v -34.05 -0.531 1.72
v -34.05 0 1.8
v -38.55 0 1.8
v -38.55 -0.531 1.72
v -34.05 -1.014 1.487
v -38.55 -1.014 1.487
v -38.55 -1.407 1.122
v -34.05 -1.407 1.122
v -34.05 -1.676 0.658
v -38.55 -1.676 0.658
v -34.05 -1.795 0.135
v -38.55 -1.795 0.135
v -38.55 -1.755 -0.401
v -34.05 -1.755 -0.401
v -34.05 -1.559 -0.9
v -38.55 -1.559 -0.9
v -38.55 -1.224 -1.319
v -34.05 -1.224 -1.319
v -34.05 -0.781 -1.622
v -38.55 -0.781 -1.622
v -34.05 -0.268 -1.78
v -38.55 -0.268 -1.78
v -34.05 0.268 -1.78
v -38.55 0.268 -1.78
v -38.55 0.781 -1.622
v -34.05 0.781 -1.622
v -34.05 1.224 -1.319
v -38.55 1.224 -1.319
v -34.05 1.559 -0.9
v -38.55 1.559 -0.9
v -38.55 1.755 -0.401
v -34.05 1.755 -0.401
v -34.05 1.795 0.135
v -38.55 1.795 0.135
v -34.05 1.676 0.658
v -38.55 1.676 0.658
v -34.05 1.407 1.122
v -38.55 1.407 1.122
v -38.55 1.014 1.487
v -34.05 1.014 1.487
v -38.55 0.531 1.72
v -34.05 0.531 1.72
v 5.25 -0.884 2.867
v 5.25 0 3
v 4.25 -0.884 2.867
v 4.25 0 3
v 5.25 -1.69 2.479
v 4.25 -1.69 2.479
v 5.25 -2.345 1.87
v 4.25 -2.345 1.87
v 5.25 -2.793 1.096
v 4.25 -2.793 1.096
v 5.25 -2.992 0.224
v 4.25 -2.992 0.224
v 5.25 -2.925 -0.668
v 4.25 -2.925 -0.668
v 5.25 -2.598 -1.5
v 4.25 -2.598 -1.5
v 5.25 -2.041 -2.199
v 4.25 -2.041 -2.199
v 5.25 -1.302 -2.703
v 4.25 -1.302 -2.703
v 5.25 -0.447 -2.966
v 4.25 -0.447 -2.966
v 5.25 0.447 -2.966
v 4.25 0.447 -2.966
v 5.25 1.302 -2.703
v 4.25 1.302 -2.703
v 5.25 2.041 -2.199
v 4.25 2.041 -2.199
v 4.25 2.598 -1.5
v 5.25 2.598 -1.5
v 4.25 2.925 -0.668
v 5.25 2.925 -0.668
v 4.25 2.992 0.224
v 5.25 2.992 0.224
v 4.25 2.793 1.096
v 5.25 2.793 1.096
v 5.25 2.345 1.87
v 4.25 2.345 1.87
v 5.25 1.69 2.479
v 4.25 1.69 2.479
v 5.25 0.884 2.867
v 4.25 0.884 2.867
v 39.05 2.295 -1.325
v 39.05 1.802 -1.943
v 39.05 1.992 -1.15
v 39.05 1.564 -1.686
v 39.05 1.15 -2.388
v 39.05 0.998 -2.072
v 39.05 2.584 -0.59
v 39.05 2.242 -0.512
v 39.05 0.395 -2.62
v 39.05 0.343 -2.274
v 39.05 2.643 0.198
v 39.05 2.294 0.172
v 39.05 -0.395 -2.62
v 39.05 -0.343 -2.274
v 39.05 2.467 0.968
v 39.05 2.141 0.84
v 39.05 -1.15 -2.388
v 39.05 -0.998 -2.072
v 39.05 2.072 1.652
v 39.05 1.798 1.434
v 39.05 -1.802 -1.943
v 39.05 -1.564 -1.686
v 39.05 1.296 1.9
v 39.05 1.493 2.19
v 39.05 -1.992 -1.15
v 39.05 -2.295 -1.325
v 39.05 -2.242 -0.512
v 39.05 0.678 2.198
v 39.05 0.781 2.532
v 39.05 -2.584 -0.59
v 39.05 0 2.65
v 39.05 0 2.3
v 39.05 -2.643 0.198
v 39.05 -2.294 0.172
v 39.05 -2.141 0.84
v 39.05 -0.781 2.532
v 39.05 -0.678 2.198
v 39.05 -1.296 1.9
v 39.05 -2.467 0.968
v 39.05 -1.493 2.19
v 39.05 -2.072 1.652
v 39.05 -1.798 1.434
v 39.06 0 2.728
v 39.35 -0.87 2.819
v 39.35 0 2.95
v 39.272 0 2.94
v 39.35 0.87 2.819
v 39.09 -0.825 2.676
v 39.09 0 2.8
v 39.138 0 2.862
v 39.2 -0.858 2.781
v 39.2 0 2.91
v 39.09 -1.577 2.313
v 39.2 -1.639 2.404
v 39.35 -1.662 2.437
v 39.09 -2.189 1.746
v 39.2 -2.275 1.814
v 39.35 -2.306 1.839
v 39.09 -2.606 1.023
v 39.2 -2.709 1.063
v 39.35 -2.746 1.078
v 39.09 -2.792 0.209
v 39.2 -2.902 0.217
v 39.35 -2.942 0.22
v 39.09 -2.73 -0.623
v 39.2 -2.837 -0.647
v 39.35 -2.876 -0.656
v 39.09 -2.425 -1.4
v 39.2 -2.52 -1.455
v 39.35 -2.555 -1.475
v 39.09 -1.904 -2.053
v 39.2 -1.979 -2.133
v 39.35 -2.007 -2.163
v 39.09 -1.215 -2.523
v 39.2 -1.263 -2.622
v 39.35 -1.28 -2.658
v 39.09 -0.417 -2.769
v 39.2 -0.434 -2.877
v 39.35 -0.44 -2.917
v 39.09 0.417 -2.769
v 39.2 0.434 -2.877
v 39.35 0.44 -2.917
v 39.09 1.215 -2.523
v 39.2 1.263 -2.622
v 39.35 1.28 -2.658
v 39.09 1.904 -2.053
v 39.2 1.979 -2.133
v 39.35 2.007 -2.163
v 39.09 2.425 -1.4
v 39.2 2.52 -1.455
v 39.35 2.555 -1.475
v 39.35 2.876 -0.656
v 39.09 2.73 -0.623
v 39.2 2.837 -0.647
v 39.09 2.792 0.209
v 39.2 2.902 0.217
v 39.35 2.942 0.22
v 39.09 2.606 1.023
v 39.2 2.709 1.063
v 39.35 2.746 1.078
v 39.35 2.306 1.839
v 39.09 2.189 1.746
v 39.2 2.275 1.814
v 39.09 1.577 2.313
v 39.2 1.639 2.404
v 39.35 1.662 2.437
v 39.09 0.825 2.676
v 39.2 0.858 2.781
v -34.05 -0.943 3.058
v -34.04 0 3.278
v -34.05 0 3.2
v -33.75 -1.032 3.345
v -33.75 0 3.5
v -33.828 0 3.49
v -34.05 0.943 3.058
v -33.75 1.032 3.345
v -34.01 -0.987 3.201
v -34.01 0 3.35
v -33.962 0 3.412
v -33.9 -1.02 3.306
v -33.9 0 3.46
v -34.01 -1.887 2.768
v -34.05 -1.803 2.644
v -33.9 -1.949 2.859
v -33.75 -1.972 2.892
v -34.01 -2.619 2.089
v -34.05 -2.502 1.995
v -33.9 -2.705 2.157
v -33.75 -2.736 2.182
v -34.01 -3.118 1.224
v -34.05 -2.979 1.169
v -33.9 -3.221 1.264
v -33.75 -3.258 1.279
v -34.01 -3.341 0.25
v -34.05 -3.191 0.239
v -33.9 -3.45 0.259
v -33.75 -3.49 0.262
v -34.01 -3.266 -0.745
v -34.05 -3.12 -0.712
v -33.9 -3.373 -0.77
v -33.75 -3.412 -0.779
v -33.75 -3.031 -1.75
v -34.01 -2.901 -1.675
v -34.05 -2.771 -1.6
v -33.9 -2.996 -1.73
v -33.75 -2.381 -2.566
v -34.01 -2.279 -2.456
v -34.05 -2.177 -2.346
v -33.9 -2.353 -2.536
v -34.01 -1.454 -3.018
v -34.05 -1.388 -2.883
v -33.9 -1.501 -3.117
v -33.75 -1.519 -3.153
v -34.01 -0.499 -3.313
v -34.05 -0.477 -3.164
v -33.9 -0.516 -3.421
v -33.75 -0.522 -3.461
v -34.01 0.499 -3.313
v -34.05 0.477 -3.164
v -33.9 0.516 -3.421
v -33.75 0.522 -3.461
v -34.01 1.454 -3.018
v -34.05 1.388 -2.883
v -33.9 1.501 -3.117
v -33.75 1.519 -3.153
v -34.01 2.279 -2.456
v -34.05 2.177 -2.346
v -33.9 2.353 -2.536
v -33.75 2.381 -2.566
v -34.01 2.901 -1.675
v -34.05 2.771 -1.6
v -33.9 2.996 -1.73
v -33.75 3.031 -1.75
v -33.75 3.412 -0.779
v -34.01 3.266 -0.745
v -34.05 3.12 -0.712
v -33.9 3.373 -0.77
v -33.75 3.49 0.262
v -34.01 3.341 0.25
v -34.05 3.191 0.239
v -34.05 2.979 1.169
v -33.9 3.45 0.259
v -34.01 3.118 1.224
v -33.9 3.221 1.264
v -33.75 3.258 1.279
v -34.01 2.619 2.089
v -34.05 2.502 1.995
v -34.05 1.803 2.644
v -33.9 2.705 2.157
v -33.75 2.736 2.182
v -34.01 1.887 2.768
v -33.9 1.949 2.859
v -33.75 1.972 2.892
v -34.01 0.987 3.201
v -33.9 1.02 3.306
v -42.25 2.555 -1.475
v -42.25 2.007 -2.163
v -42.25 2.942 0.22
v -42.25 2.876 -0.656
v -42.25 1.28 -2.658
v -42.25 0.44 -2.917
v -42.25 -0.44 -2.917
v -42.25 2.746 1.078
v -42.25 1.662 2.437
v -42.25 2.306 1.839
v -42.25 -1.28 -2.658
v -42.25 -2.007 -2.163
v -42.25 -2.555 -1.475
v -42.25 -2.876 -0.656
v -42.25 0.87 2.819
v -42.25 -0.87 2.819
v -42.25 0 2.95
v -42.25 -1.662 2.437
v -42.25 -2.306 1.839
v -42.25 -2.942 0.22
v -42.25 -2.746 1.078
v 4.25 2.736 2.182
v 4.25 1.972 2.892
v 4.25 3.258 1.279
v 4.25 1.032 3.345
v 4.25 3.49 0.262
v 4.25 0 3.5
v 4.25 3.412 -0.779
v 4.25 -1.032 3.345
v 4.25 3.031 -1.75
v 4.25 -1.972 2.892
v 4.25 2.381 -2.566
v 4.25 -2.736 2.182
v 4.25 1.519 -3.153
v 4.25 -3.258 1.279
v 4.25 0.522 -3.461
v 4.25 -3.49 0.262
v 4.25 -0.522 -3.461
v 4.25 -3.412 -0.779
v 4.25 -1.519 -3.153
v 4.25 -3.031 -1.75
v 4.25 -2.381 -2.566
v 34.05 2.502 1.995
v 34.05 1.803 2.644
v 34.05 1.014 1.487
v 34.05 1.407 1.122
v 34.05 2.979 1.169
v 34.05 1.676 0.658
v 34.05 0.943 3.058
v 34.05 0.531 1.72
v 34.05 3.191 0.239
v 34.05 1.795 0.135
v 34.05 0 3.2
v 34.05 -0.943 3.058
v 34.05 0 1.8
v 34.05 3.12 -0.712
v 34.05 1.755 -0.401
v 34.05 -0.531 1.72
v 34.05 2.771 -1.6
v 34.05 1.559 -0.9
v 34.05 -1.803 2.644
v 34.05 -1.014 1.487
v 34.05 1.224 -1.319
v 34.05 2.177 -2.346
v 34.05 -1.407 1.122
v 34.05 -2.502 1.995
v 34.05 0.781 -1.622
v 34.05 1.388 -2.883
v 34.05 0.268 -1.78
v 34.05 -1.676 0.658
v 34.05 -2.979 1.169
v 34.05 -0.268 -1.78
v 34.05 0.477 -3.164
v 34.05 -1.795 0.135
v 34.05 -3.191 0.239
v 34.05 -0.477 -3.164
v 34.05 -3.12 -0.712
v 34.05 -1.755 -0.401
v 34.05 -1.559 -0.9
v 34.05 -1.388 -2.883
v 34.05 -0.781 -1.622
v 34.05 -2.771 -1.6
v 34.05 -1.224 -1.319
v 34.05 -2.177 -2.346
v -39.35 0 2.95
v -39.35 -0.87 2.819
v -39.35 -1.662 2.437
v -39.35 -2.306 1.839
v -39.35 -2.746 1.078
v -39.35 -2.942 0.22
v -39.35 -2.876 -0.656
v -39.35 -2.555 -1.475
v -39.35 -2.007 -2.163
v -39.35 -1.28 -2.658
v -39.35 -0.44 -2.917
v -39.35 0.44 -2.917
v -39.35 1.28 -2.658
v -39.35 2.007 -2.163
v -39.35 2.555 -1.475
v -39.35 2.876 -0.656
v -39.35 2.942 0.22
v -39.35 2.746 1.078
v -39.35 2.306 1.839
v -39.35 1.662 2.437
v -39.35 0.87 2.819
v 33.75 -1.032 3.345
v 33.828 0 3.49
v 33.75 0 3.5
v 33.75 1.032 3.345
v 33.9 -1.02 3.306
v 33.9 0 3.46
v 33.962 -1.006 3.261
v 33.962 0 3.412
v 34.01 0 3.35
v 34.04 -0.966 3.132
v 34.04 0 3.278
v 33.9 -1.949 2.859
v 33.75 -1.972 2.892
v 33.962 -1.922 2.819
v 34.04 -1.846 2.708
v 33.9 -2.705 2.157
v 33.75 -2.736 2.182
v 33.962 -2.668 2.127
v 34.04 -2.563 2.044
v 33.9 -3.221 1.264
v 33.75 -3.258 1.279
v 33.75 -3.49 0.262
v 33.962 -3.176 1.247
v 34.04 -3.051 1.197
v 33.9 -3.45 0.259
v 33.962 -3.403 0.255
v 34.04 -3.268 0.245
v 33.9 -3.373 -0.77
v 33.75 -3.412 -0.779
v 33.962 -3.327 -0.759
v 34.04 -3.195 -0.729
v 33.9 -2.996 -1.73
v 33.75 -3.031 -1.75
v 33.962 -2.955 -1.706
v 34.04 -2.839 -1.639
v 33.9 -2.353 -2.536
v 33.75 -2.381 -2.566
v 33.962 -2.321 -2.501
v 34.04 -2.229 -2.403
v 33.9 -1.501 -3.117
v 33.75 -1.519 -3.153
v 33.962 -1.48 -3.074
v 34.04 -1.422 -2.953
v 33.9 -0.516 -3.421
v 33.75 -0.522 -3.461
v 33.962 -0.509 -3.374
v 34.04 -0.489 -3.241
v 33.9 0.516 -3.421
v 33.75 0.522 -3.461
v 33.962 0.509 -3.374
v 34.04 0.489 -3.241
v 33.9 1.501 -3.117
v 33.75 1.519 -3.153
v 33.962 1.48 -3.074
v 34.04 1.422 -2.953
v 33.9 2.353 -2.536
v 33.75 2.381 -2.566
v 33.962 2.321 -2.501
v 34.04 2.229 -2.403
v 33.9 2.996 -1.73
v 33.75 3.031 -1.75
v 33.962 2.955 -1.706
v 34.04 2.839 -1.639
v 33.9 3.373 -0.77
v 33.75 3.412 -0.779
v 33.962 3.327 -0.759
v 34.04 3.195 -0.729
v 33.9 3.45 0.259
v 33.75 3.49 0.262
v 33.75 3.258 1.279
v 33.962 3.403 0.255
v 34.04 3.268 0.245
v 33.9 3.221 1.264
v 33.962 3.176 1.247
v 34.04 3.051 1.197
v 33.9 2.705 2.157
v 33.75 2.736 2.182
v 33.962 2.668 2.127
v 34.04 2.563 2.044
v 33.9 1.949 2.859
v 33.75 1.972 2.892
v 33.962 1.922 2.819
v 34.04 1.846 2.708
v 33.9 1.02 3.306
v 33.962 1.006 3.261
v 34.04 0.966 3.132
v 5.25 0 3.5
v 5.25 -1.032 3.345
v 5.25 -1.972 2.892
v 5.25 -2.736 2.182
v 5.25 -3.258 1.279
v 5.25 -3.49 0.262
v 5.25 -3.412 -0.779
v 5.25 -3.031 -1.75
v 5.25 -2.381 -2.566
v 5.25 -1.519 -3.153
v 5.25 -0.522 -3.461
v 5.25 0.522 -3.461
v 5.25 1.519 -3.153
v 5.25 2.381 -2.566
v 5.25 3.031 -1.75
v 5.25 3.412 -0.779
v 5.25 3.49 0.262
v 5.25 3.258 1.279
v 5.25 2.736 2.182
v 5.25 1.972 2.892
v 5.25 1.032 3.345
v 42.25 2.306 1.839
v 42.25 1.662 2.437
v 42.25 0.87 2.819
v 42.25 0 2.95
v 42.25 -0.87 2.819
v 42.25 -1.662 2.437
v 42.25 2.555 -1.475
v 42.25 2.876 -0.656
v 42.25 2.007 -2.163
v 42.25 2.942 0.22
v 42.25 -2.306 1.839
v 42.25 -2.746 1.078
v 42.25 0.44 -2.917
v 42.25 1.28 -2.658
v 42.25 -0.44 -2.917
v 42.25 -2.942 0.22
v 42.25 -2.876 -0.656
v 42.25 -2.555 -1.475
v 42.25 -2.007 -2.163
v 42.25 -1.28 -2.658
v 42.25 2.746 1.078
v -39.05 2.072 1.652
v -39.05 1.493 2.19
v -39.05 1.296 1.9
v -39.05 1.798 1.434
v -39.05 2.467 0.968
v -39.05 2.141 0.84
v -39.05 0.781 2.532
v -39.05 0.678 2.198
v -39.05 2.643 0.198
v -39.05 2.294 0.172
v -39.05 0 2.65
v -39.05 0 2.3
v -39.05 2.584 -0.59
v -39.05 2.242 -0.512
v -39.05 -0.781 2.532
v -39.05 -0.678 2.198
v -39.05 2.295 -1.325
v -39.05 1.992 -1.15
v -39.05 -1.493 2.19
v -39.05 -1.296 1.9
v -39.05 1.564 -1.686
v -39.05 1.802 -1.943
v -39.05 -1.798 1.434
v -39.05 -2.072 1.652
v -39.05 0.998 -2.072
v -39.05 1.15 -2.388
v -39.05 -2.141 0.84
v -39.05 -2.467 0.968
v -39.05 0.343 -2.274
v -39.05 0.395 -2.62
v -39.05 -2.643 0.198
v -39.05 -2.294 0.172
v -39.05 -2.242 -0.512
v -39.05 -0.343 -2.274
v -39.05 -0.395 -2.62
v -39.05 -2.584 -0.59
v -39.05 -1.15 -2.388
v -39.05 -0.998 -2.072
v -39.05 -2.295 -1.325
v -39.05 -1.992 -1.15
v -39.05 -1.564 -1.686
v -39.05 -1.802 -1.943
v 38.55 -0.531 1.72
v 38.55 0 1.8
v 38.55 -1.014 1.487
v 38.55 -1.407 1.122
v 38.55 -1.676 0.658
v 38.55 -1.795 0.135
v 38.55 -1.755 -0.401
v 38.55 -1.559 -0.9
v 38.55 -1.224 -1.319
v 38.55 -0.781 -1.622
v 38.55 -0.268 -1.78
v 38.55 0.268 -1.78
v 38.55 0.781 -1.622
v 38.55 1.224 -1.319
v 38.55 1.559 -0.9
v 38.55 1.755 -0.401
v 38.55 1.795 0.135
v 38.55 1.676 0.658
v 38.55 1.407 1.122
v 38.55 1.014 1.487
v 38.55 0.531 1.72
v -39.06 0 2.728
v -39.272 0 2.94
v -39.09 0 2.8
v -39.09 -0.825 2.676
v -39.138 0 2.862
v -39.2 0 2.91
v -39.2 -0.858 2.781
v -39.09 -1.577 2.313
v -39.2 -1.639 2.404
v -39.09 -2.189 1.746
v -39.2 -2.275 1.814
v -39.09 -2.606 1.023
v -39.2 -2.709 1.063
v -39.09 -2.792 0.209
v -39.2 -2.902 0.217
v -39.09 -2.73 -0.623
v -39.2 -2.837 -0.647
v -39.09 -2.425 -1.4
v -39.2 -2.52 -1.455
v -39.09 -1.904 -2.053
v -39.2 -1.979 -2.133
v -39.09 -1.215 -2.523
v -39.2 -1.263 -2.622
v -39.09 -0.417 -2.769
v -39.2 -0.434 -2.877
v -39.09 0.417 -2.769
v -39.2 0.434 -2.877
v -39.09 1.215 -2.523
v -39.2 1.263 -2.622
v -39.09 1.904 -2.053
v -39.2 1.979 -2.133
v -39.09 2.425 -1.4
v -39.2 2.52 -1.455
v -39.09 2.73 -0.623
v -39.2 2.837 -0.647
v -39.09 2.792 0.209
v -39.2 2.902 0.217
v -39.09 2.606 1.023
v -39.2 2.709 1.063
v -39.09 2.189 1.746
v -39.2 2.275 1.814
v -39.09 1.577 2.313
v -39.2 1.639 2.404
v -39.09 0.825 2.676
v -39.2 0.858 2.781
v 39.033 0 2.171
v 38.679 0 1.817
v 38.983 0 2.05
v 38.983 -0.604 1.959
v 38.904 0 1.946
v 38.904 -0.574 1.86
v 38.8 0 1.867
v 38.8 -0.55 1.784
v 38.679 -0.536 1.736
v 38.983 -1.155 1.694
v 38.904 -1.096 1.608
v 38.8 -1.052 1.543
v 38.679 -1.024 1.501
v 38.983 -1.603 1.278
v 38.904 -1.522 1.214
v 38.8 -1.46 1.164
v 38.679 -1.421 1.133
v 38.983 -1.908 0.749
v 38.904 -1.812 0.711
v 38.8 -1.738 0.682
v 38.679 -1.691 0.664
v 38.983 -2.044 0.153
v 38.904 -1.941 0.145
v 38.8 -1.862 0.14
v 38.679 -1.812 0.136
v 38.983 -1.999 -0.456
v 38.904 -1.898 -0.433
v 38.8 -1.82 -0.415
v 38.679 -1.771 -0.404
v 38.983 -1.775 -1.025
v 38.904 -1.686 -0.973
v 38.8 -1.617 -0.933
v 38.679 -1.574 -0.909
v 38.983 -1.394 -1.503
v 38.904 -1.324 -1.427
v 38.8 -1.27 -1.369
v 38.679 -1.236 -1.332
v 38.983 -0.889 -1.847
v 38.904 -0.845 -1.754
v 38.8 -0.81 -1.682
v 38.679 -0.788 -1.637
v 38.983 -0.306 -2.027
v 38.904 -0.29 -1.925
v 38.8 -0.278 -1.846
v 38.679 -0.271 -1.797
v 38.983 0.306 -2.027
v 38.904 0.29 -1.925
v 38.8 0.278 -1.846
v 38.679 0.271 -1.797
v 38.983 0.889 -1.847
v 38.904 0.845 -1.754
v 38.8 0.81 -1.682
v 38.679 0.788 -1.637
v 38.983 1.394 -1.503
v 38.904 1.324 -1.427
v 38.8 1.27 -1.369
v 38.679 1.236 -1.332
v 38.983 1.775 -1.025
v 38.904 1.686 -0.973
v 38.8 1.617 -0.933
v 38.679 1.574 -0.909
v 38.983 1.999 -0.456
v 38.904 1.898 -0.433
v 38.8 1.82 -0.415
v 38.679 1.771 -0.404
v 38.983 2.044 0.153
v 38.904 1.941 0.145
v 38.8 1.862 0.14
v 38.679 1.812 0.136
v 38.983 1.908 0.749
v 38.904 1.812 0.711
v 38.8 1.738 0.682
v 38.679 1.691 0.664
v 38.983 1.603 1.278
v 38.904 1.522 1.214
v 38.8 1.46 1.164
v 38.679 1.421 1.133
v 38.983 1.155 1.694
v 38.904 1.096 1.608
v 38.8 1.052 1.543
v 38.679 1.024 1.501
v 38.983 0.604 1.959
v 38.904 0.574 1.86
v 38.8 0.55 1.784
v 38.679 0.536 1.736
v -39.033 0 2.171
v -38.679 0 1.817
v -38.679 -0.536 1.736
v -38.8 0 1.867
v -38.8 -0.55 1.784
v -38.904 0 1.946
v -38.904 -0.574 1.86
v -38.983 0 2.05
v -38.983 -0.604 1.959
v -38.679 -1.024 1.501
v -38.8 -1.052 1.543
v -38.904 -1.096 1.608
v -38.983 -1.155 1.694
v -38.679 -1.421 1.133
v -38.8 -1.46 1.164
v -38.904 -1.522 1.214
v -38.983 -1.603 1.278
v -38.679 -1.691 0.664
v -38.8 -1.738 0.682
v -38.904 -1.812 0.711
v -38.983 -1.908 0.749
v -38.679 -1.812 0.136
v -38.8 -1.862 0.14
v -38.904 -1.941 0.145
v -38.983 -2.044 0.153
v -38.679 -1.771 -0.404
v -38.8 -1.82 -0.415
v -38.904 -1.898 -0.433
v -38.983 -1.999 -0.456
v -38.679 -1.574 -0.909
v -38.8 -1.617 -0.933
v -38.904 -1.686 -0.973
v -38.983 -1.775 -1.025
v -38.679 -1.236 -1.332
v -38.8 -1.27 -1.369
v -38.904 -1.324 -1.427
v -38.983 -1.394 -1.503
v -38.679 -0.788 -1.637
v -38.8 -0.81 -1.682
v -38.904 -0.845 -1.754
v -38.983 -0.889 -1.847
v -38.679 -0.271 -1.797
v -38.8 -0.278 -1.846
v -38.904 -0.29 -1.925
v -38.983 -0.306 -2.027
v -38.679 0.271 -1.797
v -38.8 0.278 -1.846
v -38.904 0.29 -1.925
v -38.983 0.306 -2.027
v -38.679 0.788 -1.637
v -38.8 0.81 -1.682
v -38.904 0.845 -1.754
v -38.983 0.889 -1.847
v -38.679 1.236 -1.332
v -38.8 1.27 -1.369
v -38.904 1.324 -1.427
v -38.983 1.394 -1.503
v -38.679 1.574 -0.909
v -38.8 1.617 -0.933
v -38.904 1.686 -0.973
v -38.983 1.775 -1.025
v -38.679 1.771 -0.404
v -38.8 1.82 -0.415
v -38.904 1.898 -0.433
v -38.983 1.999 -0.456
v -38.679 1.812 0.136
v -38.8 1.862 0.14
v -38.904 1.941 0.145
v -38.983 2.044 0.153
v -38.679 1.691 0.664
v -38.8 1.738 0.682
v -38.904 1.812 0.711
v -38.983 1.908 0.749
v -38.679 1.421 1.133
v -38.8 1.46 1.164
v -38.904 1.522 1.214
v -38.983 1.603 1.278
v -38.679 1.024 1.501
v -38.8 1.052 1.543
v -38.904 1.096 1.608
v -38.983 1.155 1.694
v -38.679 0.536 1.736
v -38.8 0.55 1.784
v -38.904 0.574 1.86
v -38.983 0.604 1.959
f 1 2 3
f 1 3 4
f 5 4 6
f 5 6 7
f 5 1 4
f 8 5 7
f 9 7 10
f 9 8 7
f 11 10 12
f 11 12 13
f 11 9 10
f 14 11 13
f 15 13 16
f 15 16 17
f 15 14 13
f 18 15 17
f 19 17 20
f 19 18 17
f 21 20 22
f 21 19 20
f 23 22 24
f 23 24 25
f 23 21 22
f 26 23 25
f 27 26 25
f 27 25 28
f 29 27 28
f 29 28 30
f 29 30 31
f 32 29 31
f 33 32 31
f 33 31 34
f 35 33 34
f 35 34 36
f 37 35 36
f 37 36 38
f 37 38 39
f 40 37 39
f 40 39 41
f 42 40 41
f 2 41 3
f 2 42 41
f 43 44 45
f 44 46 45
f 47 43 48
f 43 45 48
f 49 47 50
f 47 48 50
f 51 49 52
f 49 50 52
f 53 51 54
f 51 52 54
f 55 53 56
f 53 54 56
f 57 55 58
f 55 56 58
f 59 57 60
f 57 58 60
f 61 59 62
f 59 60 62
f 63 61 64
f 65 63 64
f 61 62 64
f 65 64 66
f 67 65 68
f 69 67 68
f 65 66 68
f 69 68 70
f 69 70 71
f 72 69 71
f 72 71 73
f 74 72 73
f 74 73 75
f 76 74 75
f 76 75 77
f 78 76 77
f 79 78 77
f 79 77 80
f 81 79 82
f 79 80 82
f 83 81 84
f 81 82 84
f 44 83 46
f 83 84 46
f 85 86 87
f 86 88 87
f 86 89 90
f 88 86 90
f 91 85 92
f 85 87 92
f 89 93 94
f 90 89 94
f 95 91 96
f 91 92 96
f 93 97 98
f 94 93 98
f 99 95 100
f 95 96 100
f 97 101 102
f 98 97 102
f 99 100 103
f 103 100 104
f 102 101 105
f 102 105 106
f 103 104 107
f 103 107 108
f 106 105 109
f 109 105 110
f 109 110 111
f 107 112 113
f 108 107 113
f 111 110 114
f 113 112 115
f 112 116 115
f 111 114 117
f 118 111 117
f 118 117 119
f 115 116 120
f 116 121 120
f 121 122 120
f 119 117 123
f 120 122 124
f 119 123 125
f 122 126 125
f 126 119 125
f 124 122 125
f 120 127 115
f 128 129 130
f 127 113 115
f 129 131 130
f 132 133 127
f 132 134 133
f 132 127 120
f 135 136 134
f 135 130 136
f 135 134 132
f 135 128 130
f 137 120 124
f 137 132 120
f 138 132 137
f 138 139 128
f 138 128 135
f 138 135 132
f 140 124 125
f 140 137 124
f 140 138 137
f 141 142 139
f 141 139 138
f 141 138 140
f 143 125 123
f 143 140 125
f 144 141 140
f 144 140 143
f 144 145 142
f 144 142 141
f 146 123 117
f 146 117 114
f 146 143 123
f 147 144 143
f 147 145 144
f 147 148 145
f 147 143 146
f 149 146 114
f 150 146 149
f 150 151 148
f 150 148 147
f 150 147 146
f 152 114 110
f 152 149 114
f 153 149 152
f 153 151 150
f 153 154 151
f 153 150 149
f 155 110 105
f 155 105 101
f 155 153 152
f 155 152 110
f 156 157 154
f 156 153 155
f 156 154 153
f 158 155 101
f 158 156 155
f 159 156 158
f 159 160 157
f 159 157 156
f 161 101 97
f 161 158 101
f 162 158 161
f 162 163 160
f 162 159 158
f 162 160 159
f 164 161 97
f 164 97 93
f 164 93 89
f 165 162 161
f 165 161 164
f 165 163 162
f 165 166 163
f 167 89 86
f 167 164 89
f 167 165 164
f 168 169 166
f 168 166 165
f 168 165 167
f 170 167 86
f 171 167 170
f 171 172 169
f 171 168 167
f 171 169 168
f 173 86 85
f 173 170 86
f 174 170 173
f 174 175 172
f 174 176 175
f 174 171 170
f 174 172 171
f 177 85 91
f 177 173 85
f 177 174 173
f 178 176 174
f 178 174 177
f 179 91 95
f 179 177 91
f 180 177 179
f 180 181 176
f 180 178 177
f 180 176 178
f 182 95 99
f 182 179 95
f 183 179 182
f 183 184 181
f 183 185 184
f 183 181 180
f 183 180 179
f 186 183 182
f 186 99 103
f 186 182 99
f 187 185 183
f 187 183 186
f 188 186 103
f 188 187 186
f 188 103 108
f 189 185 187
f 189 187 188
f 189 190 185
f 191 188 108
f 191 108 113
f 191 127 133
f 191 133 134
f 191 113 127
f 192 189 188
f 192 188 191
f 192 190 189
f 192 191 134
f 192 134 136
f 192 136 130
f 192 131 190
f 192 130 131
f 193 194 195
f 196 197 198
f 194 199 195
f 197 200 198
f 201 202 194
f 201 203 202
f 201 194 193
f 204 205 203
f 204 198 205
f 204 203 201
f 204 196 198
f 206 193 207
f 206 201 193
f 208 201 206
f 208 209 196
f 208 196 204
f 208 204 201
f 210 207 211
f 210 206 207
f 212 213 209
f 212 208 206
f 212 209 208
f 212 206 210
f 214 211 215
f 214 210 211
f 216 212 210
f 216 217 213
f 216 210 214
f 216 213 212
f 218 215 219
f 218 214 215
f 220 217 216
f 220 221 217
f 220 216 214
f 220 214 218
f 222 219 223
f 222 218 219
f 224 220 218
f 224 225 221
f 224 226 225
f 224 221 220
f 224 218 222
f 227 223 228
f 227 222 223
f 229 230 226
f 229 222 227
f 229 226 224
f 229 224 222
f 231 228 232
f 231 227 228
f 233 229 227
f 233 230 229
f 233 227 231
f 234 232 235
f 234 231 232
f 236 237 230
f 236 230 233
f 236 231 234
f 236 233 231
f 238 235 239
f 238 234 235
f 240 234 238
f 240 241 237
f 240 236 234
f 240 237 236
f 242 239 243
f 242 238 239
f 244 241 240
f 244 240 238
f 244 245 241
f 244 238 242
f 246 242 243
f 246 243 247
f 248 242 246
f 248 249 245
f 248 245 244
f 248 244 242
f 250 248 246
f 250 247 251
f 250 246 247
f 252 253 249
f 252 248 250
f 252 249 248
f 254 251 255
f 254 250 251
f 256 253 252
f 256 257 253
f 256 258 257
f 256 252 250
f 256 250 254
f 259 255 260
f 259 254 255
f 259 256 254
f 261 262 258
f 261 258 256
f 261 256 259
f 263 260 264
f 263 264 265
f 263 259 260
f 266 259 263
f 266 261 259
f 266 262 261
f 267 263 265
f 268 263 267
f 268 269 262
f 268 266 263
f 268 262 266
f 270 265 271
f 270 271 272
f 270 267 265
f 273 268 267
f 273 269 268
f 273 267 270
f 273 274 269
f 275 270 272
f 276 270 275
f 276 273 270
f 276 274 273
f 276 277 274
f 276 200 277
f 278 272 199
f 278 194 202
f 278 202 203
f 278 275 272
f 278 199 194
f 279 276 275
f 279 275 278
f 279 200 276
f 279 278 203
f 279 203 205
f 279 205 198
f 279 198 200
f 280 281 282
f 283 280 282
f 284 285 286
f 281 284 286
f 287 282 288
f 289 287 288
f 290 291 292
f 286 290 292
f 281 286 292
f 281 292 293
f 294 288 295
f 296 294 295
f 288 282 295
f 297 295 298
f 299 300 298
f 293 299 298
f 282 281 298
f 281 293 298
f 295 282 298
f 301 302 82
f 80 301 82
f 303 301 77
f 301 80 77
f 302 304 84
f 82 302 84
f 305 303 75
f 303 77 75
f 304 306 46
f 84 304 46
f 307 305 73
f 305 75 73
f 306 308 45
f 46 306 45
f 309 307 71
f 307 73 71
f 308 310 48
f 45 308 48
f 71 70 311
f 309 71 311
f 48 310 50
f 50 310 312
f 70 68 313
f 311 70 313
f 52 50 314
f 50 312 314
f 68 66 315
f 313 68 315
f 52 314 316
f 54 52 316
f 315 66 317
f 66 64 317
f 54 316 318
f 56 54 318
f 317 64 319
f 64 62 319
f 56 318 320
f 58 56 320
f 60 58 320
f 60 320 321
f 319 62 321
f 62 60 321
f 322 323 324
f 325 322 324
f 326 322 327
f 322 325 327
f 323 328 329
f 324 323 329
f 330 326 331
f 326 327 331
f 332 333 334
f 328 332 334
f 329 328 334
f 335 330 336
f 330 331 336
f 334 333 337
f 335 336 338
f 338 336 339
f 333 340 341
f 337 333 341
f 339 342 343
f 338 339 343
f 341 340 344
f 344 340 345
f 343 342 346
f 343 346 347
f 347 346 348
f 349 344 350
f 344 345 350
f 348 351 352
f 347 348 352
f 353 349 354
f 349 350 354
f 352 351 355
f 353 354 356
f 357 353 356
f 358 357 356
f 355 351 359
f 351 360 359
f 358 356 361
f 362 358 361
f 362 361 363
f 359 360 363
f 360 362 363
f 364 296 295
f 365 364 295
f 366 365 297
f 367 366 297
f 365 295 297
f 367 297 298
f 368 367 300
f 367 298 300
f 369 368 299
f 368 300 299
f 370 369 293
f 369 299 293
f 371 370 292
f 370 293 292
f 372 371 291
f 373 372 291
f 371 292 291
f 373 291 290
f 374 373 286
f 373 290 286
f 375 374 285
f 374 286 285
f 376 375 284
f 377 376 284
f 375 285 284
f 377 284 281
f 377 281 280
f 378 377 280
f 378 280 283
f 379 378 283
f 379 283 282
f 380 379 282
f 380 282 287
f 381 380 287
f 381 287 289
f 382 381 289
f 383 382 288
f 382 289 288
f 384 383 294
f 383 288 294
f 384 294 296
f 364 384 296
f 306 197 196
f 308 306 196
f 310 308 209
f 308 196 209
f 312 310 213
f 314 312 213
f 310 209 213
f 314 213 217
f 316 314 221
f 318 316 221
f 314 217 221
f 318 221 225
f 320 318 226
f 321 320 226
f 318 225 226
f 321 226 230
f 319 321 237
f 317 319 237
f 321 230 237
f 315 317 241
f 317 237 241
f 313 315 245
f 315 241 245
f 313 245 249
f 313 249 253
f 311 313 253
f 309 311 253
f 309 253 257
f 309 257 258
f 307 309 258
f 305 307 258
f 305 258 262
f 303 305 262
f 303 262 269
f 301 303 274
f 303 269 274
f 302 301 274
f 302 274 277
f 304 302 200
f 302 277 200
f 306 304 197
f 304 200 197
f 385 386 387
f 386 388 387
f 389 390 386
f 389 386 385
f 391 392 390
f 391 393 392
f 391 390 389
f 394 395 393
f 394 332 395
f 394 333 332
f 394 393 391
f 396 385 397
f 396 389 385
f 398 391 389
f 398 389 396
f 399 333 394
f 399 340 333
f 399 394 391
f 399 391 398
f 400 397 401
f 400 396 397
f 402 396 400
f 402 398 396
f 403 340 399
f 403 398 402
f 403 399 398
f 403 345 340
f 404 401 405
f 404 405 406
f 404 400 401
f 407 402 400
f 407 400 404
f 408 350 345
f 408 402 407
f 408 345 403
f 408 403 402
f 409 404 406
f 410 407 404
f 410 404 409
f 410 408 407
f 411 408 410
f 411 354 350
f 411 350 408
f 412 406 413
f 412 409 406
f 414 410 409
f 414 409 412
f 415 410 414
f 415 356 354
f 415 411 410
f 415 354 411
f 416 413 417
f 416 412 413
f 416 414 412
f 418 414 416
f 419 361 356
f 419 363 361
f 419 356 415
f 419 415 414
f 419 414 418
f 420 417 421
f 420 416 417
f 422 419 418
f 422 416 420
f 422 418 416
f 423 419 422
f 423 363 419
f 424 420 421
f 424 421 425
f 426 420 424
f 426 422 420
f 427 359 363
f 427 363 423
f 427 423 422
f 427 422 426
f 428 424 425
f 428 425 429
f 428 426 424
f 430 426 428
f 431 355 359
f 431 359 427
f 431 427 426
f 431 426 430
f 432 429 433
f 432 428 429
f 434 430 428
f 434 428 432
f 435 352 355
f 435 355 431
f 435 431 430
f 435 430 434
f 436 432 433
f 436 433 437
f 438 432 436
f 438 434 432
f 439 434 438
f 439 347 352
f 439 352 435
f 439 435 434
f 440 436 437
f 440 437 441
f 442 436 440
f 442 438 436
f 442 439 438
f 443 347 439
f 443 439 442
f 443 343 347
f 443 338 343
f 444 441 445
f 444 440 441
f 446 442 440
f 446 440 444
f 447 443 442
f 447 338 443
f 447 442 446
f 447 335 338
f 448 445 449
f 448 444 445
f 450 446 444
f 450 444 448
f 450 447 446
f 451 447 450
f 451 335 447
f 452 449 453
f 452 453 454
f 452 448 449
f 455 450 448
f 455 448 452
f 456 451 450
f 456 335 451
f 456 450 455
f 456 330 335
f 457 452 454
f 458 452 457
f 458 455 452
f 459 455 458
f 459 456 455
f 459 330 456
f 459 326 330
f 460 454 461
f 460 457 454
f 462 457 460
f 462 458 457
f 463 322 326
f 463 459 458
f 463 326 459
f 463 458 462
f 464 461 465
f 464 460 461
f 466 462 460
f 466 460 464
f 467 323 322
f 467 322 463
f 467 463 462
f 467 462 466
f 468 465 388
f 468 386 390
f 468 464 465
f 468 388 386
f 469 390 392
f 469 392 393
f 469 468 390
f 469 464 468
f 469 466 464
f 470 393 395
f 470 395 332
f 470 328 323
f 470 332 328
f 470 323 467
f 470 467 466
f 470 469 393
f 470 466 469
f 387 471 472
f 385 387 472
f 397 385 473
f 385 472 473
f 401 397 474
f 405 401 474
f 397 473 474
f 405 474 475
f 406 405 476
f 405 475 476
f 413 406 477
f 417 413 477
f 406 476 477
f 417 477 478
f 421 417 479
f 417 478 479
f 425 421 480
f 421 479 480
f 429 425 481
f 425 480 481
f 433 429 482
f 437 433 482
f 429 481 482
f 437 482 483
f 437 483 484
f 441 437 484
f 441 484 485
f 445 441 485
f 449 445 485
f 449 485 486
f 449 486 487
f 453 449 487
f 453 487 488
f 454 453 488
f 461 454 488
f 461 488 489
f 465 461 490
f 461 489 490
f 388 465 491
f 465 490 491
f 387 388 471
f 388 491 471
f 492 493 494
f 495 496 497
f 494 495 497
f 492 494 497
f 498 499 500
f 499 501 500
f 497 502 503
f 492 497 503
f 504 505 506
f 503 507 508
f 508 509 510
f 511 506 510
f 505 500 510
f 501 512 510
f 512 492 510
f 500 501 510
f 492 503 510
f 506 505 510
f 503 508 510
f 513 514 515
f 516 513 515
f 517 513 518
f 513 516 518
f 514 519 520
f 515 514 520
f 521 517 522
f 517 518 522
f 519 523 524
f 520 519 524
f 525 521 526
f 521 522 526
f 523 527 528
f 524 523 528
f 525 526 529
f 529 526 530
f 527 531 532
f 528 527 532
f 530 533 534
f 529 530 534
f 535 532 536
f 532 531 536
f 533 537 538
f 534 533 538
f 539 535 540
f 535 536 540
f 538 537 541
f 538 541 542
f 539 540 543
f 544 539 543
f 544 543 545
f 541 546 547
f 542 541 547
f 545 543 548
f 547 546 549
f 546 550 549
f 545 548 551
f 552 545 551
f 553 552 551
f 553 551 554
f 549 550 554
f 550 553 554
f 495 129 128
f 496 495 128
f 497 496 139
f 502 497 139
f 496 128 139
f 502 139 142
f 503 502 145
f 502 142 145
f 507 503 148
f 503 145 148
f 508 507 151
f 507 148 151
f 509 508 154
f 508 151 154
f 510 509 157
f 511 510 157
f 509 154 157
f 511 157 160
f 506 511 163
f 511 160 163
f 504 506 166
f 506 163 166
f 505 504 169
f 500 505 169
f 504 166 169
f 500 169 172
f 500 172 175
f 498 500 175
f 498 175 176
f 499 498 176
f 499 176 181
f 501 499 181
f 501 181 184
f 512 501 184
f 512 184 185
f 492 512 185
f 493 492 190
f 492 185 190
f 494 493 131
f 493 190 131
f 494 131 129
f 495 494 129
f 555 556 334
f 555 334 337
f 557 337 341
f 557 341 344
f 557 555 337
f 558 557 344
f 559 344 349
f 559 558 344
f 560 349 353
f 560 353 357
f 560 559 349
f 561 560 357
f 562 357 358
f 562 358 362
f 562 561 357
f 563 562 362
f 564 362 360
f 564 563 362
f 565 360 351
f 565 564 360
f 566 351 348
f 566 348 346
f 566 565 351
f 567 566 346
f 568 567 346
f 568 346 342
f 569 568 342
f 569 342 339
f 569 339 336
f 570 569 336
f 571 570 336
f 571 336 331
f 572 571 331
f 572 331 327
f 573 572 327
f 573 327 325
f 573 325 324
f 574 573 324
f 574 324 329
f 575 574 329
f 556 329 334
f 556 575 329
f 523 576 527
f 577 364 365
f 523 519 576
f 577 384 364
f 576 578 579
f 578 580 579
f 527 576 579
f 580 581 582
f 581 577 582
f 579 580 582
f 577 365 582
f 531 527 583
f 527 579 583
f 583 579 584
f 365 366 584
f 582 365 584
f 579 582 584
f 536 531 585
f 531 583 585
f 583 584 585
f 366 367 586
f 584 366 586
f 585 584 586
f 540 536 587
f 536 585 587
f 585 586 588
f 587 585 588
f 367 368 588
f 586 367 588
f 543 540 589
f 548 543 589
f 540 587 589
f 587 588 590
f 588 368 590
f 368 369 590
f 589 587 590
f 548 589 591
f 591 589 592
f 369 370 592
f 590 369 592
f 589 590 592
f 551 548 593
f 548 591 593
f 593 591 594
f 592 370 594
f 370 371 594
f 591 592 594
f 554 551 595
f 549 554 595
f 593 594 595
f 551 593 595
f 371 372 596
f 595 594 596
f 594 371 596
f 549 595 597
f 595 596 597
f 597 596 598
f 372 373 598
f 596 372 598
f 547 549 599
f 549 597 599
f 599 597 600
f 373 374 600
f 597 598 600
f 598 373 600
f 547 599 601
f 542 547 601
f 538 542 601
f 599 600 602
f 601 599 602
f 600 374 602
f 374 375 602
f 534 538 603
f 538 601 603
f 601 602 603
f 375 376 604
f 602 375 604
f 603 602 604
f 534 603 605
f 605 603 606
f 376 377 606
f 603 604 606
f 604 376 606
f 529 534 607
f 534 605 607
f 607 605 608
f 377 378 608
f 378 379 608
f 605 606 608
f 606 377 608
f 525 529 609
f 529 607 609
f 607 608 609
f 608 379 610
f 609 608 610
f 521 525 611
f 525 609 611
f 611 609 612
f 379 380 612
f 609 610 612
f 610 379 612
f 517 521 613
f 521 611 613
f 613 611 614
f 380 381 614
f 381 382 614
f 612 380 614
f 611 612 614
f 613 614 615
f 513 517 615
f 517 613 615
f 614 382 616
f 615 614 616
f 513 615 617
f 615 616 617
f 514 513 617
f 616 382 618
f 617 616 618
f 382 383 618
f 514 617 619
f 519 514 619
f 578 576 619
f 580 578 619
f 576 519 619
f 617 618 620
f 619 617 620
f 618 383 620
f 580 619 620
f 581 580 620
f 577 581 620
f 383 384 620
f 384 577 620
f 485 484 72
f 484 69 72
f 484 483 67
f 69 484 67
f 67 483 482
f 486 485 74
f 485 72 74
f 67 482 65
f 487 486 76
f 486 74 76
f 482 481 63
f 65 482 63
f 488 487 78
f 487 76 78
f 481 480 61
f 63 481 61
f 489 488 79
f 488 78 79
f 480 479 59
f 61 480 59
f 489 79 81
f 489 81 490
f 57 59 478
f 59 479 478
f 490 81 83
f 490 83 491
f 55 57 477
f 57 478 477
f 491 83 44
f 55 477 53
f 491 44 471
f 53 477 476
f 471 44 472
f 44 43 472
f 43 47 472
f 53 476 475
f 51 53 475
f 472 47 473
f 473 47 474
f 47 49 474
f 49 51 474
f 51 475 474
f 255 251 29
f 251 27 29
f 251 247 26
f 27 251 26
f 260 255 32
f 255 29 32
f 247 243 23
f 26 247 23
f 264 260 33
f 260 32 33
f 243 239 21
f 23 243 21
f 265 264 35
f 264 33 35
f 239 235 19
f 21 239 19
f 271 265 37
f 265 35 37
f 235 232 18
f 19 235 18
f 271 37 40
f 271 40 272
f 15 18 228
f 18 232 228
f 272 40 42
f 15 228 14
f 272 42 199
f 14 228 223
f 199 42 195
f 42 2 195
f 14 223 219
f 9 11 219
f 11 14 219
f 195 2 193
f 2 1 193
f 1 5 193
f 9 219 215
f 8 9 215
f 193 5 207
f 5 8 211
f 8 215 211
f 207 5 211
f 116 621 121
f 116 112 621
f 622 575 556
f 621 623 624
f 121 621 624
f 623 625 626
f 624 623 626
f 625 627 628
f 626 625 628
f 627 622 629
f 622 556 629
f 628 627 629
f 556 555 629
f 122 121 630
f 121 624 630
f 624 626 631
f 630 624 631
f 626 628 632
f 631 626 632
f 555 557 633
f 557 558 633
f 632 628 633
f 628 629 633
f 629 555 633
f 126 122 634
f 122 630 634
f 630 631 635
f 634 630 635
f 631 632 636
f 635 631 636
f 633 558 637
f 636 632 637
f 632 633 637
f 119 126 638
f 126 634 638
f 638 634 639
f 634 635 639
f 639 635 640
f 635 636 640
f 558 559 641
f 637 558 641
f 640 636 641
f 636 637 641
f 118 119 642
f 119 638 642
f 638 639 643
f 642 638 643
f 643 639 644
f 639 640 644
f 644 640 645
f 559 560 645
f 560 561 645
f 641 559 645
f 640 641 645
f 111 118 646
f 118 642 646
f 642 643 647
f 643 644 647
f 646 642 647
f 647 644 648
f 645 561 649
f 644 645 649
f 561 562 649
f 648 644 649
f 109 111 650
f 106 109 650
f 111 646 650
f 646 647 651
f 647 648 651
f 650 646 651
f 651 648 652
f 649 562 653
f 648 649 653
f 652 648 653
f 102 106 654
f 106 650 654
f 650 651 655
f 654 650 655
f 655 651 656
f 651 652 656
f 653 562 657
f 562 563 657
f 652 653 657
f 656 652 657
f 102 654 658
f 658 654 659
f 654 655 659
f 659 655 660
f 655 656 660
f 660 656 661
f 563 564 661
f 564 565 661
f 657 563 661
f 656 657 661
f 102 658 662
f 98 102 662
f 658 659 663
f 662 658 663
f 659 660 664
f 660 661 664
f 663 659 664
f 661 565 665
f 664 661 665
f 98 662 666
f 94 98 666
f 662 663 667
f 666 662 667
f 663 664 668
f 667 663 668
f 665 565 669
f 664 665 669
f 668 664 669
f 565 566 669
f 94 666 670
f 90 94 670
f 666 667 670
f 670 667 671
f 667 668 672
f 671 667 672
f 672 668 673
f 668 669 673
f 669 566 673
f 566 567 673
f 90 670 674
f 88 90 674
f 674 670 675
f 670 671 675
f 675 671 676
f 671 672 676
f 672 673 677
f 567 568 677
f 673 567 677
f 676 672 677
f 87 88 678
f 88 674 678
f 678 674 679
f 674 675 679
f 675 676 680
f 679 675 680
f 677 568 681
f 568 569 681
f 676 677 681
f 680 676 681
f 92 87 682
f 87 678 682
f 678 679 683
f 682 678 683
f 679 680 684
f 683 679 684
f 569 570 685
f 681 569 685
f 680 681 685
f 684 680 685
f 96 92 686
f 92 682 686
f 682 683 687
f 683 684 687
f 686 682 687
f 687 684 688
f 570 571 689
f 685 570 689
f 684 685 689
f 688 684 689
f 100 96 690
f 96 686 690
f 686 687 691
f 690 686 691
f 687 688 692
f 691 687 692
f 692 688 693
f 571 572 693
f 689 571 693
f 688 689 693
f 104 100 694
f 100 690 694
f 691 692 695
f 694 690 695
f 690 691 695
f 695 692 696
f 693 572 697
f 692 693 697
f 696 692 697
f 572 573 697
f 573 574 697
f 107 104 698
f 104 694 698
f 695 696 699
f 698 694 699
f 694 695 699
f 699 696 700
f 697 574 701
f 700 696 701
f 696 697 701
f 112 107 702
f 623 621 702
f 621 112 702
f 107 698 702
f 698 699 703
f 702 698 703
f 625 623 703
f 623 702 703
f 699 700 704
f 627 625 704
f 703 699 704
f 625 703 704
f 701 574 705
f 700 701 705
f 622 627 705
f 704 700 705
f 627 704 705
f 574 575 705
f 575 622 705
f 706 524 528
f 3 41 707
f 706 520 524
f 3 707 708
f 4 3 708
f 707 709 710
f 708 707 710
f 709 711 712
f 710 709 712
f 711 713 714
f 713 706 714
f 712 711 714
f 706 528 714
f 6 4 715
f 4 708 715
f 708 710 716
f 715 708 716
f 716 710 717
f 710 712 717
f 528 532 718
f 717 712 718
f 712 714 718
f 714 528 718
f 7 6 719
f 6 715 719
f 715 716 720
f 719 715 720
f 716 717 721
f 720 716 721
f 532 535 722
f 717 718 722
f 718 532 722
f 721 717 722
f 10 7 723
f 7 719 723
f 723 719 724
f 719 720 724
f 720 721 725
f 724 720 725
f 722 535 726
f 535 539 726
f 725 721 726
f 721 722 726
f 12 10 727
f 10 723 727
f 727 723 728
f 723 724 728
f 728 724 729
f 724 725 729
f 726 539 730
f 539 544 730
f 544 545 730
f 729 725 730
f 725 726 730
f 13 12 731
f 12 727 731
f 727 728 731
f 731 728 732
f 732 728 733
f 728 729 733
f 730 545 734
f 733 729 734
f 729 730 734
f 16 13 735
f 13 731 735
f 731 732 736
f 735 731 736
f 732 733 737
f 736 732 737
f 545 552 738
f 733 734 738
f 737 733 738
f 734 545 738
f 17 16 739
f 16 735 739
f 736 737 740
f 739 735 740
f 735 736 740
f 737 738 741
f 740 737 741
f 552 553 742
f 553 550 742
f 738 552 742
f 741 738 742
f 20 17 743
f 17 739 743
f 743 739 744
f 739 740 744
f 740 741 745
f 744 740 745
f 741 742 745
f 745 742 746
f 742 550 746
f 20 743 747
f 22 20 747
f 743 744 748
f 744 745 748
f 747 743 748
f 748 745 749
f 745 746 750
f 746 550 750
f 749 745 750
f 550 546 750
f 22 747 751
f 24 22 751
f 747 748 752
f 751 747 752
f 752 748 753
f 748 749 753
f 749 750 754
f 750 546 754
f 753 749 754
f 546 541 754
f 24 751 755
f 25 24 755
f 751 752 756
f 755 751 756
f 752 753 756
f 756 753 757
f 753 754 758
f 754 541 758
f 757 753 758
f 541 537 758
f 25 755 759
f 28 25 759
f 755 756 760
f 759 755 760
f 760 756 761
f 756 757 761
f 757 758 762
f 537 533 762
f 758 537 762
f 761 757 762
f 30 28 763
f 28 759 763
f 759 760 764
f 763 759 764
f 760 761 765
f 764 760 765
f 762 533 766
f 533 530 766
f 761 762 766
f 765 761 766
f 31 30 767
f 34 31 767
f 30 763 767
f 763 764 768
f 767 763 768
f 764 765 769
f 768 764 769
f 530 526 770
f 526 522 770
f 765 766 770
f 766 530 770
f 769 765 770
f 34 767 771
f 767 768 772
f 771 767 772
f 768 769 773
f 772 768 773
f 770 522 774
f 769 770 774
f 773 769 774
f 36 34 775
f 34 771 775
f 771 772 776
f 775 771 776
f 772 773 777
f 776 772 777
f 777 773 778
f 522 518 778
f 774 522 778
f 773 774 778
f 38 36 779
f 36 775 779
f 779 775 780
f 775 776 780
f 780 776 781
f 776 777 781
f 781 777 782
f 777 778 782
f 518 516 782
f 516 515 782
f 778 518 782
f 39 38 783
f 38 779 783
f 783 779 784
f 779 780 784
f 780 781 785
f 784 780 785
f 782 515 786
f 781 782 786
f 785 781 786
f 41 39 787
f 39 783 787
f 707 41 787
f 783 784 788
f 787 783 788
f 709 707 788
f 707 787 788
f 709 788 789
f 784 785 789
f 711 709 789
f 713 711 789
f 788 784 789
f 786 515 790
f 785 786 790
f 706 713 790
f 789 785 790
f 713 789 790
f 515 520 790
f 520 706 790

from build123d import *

# Parameters (mm, degrees)
F0_W = 5
F0_H = 1.8
F2_R = 0.5
F3_R = 0.3


with BuildPart() as f1:
    # F0 (on Front) → F1 (revolve)
    with BuildSketch(Plane.XZ):
        Polygon((4.25, 3.5), (-34.05, 3.5), (-34.05, 1.8), (-34.05, 0), (34.05, 0), (34.05, 1.8), (34.05, 3.5), (5.25, 3.5), (5.25, 3), (4.25, 3), align=None)
        with Locations((-36.55, 0.9)):
            Rectangle(F0_W, F0_H)
        Polygon((-39.05, 0), (-39.05, 1.8), (-39.05, 2.95), (-42.25, 2.95), (-42.25, 0), align=None)
        with Locations((36.55, 0.9)):
            Rectangle(F0_W, F0_H)
        Polygon((39.05, 1.8), (39.05, 0), (42.25, 0), (42.25, 2.95), (39.05, 2.95), align=None)
    revolve(axis=Axis((0, 0, 0), (1, 0, 0)))

    # F2
    f2_edges = [f1.edges().sort_by_distance(p)[0] for p in [
        (-39.05, 0, -1.8),
        (39.05, 0, -1.8),
    ]]
    fillet(f2_edges, radius=F2_R)

    # F3
    f3_edges = [f1.edges().sort_by_distance(p)[0] for p in [
        (-34.05, 0, -3.5),
        (34.05, 0, -3.5),
        (39.05, 0, -2.95),
        (-39.05, 0, -2.95),
    ]]
    fillet(f3_edges, radius=F3_R)


solid = f1.part
